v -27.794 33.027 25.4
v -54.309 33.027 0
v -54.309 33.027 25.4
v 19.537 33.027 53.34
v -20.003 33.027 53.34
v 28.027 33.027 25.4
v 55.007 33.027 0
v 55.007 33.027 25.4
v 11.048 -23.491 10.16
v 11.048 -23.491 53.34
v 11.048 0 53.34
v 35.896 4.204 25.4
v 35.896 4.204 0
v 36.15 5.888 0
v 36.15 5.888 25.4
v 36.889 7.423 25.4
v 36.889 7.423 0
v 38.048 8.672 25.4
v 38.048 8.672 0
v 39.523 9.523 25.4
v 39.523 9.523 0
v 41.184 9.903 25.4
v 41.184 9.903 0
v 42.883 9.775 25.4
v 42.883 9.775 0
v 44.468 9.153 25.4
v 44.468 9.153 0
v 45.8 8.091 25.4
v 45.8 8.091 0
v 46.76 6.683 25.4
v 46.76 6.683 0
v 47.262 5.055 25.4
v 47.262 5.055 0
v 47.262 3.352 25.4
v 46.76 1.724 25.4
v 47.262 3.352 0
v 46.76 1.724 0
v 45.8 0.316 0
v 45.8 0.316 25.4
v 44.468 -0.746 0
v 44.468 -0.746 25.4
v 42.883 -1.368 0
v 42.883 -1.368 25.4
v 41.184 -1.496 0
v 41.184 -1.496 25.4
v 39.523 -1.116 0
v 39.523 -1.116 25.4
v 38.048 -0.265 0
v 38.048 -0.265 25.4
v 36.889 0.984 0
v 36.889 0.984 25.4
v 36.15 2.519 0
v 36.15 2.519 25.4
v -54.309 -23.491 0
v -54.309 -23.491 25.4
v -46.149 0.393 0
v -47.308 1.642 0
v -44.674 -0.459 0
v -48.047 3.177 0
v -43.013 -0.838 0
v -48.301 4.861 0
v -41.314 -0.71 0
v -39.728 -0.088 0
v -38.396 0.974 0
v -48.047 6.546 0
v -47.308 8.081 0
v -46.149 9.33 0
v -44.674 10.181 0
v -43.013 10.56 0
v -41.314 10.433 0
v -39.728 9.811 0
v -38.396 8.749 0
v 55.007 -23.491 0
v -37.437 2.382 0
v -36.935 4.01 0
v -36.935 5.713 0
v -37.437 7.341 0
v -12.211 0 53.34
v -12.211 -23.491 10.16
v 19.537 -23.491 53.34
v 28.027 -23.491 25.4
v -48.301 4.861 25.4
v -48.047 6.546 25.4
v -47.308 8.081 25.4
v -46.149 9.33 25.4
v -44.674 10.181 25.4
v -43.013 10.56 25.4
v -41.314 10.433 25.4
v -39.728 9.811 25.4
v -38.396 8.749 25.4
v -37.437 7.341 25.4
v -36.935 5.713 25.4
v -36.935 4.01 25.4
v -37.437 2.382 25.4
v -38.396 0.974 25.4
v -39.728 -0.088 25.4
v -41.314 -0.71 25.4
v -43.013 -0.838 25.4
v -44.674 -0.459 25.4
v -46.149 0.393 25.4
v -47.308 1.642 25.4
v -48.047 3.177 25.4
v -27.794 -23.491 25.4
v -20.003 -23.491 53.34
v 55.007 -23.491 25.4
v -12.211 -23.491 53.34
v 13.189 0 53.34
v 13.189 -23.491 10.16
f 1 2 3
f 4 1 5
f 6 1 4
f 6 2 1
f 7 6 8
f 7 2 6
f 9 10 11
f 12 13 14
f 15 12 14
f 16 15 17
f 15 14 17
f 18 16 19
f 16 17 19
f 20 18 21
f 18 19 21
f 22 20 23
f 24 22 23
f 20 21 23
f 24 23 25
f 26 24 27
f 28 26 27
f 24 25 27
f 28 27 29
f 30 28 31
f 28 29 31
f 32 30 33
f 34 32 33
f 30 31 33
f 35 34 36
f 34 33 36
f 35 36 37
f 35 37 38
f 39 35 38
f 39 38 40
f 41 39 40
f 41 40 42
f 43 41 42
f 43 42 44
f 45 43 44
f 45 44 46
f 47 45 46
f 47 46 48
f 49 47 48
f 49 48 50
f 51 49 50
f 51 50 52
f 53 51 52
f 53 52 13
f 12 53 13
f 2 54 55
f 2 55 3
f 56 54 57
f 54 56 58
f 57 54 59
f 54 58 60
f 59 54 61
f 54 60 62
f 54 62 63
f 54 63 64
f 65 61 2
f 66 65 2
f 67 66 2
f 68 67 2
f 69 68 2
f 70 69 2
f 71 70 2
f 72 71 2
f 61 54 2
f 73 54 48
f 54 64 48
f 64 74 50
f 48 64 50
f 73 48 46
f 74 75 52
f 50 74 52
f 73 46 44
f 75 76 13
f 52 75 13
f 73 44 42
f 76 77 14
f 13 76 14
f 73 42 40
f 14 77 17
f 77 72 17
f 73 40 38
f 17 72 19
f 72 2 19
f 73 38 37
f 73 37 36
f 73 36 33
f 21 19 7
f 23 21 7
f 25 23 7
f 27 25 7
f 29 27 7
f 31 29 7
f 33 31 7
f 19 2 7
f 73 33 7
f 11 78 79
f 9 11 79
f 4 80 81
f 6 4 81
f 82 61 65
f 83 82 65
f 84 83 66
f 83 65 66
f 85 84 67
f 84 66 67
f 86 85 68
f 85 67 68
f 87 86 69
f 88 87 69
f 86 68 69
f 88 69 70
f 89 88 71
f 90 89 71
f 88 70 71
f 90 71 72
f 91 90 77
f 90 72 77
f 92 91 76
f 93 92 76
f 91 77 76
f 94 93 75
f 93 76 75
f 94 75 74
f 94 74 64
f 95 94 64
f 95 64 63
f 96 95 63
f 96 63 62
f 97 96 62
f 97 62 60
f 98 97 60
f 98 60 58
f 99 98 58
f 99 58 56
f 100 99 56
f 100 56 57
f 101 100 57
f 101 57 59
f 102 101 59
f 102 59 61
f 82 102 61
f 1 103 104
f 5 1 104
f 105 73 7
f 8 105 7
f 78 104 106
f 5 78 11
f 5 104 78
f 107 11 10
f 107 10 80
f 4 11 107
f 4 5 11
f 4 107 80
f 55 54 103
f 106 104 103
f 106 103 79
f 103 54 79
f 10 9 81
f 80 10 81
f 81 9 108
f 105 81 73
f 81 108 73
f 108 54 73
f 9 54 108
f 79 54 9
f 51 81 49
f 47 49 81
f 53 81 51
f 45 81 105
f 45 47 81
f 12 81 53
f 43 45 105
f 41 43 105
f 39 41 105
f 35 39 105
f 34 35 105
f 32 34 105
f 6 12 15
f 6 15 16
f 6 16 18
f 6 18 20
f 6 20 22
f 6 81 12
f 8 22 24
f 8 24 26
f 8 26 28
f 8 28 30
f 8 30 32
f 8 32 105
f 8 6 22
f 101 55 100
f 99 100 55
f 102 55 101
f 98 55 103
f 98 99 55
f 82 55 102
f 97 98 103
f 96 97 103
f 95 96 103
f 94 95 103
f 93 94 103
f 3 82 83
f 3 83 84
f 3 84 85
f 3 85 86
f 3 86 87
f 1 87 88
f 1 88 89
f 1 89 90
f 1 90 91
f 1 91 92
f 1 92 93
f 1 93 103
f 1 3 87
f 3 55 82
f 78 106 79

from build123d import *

# Parameters (mm, degrees)
F0_W      = 109.3159876764
F0_H      = 56.5186925232
F1_DEPTH  = 25.4
F2_W      = 55.8209288865
F2_H      = 56.5186925232
F3_DEPTH  = 27.94
F4_W      = 23.2587223873
F4_H      = 23.4913080931
F5_DEPTH  = 43.18
F7_DEPTH  = 25.4
F8_DEPTH  = 38.1
F10_DEPTH = 58.42
F12_DEPTH = 25.4
F14_D     = 11.43
F16_D     = 11.43


with BuildPart() as f1:
    # F0 (on Top) → F1 (new body)
    with BuildSketch(Plane.XY):
        with Locations((0.3488790244, 4.7680381685)):
            Rectangle(F0_W, F0_H)
    extrude(amount=F1_DEPTH)

    # F2 (on face) → F3 (join)
    with BuildSketch(Plane.XY.offset(25.4)):
        with Locations((0.1162933186, 4.7680381685)):
            Rectangle(F2_W, F2_H)
    extrude(amount=F3_DEPTH)

    # F4 (on face) → F5 (cut)
    with BuildSketch(Plane.XY.offset(53.34)):
        with Locations((-0.5814679898, -11.7456540465)):
            Rectangle(F4_W, F4_H)
    extrude(amount=-F5_DEPTH, mode=Mode.SUBTRACT)

    # F6 (on face) → F7 (cut)
    with BuildSketch(Plane.XZ.offset(23.4913080931)):
        Polygon((-27.7941711247, 25.4), (-20.0025001541, 53.34), (-27.7941711247, 53.34), align=None)
    extrude(amount=-F7_DEPTH, mode=Mode.SUBTRACT)

    # F8 (cut): a face of the model
    f8_faces = [f1.faces().sort_by_distance(p)[0] for p in [
        (-25.1969474678, 1.9086919069, 44.0266666667),
    ]]
    extrude(f8_faces, amount=-F8_DEPTH, mode=Mode.SUBTRACT)

    # F9 (on face) → F10 (cut)
    with BuildSketch(Plane.XZ.offset(23.4913080931)):
        Polygon((28.0267577618, 53.34), (19.5373254828, 53.34), (28.0267577618, 25.4), align=None)
    extrude(amount=-F10_DEPTH, mode=Mode.SUBTRACT)

    # F11 (on face) → F12 (join)
    with BuildSketch(Plane.YZ.offset(-12.2108291835)):
        Polygon((0, 10.16), (0, 53.34), (-23.4913080931, 10.16), align=None)
    extrude(amount=F12_DEPTH)

    # F14 (through all)
    with Locations(Plane.XY.offset(25.4)):
        with Locations((-42.5856821239, 4.861375317)):
            Hole(F14_D / 2)

    # F16 (through all)
    with Locations(Plane.XY.offset(25.4)):
        with Locations((41.6108891368, 4.2035188526)):
            Hole(F16_D / 2)


solid = f1.part
